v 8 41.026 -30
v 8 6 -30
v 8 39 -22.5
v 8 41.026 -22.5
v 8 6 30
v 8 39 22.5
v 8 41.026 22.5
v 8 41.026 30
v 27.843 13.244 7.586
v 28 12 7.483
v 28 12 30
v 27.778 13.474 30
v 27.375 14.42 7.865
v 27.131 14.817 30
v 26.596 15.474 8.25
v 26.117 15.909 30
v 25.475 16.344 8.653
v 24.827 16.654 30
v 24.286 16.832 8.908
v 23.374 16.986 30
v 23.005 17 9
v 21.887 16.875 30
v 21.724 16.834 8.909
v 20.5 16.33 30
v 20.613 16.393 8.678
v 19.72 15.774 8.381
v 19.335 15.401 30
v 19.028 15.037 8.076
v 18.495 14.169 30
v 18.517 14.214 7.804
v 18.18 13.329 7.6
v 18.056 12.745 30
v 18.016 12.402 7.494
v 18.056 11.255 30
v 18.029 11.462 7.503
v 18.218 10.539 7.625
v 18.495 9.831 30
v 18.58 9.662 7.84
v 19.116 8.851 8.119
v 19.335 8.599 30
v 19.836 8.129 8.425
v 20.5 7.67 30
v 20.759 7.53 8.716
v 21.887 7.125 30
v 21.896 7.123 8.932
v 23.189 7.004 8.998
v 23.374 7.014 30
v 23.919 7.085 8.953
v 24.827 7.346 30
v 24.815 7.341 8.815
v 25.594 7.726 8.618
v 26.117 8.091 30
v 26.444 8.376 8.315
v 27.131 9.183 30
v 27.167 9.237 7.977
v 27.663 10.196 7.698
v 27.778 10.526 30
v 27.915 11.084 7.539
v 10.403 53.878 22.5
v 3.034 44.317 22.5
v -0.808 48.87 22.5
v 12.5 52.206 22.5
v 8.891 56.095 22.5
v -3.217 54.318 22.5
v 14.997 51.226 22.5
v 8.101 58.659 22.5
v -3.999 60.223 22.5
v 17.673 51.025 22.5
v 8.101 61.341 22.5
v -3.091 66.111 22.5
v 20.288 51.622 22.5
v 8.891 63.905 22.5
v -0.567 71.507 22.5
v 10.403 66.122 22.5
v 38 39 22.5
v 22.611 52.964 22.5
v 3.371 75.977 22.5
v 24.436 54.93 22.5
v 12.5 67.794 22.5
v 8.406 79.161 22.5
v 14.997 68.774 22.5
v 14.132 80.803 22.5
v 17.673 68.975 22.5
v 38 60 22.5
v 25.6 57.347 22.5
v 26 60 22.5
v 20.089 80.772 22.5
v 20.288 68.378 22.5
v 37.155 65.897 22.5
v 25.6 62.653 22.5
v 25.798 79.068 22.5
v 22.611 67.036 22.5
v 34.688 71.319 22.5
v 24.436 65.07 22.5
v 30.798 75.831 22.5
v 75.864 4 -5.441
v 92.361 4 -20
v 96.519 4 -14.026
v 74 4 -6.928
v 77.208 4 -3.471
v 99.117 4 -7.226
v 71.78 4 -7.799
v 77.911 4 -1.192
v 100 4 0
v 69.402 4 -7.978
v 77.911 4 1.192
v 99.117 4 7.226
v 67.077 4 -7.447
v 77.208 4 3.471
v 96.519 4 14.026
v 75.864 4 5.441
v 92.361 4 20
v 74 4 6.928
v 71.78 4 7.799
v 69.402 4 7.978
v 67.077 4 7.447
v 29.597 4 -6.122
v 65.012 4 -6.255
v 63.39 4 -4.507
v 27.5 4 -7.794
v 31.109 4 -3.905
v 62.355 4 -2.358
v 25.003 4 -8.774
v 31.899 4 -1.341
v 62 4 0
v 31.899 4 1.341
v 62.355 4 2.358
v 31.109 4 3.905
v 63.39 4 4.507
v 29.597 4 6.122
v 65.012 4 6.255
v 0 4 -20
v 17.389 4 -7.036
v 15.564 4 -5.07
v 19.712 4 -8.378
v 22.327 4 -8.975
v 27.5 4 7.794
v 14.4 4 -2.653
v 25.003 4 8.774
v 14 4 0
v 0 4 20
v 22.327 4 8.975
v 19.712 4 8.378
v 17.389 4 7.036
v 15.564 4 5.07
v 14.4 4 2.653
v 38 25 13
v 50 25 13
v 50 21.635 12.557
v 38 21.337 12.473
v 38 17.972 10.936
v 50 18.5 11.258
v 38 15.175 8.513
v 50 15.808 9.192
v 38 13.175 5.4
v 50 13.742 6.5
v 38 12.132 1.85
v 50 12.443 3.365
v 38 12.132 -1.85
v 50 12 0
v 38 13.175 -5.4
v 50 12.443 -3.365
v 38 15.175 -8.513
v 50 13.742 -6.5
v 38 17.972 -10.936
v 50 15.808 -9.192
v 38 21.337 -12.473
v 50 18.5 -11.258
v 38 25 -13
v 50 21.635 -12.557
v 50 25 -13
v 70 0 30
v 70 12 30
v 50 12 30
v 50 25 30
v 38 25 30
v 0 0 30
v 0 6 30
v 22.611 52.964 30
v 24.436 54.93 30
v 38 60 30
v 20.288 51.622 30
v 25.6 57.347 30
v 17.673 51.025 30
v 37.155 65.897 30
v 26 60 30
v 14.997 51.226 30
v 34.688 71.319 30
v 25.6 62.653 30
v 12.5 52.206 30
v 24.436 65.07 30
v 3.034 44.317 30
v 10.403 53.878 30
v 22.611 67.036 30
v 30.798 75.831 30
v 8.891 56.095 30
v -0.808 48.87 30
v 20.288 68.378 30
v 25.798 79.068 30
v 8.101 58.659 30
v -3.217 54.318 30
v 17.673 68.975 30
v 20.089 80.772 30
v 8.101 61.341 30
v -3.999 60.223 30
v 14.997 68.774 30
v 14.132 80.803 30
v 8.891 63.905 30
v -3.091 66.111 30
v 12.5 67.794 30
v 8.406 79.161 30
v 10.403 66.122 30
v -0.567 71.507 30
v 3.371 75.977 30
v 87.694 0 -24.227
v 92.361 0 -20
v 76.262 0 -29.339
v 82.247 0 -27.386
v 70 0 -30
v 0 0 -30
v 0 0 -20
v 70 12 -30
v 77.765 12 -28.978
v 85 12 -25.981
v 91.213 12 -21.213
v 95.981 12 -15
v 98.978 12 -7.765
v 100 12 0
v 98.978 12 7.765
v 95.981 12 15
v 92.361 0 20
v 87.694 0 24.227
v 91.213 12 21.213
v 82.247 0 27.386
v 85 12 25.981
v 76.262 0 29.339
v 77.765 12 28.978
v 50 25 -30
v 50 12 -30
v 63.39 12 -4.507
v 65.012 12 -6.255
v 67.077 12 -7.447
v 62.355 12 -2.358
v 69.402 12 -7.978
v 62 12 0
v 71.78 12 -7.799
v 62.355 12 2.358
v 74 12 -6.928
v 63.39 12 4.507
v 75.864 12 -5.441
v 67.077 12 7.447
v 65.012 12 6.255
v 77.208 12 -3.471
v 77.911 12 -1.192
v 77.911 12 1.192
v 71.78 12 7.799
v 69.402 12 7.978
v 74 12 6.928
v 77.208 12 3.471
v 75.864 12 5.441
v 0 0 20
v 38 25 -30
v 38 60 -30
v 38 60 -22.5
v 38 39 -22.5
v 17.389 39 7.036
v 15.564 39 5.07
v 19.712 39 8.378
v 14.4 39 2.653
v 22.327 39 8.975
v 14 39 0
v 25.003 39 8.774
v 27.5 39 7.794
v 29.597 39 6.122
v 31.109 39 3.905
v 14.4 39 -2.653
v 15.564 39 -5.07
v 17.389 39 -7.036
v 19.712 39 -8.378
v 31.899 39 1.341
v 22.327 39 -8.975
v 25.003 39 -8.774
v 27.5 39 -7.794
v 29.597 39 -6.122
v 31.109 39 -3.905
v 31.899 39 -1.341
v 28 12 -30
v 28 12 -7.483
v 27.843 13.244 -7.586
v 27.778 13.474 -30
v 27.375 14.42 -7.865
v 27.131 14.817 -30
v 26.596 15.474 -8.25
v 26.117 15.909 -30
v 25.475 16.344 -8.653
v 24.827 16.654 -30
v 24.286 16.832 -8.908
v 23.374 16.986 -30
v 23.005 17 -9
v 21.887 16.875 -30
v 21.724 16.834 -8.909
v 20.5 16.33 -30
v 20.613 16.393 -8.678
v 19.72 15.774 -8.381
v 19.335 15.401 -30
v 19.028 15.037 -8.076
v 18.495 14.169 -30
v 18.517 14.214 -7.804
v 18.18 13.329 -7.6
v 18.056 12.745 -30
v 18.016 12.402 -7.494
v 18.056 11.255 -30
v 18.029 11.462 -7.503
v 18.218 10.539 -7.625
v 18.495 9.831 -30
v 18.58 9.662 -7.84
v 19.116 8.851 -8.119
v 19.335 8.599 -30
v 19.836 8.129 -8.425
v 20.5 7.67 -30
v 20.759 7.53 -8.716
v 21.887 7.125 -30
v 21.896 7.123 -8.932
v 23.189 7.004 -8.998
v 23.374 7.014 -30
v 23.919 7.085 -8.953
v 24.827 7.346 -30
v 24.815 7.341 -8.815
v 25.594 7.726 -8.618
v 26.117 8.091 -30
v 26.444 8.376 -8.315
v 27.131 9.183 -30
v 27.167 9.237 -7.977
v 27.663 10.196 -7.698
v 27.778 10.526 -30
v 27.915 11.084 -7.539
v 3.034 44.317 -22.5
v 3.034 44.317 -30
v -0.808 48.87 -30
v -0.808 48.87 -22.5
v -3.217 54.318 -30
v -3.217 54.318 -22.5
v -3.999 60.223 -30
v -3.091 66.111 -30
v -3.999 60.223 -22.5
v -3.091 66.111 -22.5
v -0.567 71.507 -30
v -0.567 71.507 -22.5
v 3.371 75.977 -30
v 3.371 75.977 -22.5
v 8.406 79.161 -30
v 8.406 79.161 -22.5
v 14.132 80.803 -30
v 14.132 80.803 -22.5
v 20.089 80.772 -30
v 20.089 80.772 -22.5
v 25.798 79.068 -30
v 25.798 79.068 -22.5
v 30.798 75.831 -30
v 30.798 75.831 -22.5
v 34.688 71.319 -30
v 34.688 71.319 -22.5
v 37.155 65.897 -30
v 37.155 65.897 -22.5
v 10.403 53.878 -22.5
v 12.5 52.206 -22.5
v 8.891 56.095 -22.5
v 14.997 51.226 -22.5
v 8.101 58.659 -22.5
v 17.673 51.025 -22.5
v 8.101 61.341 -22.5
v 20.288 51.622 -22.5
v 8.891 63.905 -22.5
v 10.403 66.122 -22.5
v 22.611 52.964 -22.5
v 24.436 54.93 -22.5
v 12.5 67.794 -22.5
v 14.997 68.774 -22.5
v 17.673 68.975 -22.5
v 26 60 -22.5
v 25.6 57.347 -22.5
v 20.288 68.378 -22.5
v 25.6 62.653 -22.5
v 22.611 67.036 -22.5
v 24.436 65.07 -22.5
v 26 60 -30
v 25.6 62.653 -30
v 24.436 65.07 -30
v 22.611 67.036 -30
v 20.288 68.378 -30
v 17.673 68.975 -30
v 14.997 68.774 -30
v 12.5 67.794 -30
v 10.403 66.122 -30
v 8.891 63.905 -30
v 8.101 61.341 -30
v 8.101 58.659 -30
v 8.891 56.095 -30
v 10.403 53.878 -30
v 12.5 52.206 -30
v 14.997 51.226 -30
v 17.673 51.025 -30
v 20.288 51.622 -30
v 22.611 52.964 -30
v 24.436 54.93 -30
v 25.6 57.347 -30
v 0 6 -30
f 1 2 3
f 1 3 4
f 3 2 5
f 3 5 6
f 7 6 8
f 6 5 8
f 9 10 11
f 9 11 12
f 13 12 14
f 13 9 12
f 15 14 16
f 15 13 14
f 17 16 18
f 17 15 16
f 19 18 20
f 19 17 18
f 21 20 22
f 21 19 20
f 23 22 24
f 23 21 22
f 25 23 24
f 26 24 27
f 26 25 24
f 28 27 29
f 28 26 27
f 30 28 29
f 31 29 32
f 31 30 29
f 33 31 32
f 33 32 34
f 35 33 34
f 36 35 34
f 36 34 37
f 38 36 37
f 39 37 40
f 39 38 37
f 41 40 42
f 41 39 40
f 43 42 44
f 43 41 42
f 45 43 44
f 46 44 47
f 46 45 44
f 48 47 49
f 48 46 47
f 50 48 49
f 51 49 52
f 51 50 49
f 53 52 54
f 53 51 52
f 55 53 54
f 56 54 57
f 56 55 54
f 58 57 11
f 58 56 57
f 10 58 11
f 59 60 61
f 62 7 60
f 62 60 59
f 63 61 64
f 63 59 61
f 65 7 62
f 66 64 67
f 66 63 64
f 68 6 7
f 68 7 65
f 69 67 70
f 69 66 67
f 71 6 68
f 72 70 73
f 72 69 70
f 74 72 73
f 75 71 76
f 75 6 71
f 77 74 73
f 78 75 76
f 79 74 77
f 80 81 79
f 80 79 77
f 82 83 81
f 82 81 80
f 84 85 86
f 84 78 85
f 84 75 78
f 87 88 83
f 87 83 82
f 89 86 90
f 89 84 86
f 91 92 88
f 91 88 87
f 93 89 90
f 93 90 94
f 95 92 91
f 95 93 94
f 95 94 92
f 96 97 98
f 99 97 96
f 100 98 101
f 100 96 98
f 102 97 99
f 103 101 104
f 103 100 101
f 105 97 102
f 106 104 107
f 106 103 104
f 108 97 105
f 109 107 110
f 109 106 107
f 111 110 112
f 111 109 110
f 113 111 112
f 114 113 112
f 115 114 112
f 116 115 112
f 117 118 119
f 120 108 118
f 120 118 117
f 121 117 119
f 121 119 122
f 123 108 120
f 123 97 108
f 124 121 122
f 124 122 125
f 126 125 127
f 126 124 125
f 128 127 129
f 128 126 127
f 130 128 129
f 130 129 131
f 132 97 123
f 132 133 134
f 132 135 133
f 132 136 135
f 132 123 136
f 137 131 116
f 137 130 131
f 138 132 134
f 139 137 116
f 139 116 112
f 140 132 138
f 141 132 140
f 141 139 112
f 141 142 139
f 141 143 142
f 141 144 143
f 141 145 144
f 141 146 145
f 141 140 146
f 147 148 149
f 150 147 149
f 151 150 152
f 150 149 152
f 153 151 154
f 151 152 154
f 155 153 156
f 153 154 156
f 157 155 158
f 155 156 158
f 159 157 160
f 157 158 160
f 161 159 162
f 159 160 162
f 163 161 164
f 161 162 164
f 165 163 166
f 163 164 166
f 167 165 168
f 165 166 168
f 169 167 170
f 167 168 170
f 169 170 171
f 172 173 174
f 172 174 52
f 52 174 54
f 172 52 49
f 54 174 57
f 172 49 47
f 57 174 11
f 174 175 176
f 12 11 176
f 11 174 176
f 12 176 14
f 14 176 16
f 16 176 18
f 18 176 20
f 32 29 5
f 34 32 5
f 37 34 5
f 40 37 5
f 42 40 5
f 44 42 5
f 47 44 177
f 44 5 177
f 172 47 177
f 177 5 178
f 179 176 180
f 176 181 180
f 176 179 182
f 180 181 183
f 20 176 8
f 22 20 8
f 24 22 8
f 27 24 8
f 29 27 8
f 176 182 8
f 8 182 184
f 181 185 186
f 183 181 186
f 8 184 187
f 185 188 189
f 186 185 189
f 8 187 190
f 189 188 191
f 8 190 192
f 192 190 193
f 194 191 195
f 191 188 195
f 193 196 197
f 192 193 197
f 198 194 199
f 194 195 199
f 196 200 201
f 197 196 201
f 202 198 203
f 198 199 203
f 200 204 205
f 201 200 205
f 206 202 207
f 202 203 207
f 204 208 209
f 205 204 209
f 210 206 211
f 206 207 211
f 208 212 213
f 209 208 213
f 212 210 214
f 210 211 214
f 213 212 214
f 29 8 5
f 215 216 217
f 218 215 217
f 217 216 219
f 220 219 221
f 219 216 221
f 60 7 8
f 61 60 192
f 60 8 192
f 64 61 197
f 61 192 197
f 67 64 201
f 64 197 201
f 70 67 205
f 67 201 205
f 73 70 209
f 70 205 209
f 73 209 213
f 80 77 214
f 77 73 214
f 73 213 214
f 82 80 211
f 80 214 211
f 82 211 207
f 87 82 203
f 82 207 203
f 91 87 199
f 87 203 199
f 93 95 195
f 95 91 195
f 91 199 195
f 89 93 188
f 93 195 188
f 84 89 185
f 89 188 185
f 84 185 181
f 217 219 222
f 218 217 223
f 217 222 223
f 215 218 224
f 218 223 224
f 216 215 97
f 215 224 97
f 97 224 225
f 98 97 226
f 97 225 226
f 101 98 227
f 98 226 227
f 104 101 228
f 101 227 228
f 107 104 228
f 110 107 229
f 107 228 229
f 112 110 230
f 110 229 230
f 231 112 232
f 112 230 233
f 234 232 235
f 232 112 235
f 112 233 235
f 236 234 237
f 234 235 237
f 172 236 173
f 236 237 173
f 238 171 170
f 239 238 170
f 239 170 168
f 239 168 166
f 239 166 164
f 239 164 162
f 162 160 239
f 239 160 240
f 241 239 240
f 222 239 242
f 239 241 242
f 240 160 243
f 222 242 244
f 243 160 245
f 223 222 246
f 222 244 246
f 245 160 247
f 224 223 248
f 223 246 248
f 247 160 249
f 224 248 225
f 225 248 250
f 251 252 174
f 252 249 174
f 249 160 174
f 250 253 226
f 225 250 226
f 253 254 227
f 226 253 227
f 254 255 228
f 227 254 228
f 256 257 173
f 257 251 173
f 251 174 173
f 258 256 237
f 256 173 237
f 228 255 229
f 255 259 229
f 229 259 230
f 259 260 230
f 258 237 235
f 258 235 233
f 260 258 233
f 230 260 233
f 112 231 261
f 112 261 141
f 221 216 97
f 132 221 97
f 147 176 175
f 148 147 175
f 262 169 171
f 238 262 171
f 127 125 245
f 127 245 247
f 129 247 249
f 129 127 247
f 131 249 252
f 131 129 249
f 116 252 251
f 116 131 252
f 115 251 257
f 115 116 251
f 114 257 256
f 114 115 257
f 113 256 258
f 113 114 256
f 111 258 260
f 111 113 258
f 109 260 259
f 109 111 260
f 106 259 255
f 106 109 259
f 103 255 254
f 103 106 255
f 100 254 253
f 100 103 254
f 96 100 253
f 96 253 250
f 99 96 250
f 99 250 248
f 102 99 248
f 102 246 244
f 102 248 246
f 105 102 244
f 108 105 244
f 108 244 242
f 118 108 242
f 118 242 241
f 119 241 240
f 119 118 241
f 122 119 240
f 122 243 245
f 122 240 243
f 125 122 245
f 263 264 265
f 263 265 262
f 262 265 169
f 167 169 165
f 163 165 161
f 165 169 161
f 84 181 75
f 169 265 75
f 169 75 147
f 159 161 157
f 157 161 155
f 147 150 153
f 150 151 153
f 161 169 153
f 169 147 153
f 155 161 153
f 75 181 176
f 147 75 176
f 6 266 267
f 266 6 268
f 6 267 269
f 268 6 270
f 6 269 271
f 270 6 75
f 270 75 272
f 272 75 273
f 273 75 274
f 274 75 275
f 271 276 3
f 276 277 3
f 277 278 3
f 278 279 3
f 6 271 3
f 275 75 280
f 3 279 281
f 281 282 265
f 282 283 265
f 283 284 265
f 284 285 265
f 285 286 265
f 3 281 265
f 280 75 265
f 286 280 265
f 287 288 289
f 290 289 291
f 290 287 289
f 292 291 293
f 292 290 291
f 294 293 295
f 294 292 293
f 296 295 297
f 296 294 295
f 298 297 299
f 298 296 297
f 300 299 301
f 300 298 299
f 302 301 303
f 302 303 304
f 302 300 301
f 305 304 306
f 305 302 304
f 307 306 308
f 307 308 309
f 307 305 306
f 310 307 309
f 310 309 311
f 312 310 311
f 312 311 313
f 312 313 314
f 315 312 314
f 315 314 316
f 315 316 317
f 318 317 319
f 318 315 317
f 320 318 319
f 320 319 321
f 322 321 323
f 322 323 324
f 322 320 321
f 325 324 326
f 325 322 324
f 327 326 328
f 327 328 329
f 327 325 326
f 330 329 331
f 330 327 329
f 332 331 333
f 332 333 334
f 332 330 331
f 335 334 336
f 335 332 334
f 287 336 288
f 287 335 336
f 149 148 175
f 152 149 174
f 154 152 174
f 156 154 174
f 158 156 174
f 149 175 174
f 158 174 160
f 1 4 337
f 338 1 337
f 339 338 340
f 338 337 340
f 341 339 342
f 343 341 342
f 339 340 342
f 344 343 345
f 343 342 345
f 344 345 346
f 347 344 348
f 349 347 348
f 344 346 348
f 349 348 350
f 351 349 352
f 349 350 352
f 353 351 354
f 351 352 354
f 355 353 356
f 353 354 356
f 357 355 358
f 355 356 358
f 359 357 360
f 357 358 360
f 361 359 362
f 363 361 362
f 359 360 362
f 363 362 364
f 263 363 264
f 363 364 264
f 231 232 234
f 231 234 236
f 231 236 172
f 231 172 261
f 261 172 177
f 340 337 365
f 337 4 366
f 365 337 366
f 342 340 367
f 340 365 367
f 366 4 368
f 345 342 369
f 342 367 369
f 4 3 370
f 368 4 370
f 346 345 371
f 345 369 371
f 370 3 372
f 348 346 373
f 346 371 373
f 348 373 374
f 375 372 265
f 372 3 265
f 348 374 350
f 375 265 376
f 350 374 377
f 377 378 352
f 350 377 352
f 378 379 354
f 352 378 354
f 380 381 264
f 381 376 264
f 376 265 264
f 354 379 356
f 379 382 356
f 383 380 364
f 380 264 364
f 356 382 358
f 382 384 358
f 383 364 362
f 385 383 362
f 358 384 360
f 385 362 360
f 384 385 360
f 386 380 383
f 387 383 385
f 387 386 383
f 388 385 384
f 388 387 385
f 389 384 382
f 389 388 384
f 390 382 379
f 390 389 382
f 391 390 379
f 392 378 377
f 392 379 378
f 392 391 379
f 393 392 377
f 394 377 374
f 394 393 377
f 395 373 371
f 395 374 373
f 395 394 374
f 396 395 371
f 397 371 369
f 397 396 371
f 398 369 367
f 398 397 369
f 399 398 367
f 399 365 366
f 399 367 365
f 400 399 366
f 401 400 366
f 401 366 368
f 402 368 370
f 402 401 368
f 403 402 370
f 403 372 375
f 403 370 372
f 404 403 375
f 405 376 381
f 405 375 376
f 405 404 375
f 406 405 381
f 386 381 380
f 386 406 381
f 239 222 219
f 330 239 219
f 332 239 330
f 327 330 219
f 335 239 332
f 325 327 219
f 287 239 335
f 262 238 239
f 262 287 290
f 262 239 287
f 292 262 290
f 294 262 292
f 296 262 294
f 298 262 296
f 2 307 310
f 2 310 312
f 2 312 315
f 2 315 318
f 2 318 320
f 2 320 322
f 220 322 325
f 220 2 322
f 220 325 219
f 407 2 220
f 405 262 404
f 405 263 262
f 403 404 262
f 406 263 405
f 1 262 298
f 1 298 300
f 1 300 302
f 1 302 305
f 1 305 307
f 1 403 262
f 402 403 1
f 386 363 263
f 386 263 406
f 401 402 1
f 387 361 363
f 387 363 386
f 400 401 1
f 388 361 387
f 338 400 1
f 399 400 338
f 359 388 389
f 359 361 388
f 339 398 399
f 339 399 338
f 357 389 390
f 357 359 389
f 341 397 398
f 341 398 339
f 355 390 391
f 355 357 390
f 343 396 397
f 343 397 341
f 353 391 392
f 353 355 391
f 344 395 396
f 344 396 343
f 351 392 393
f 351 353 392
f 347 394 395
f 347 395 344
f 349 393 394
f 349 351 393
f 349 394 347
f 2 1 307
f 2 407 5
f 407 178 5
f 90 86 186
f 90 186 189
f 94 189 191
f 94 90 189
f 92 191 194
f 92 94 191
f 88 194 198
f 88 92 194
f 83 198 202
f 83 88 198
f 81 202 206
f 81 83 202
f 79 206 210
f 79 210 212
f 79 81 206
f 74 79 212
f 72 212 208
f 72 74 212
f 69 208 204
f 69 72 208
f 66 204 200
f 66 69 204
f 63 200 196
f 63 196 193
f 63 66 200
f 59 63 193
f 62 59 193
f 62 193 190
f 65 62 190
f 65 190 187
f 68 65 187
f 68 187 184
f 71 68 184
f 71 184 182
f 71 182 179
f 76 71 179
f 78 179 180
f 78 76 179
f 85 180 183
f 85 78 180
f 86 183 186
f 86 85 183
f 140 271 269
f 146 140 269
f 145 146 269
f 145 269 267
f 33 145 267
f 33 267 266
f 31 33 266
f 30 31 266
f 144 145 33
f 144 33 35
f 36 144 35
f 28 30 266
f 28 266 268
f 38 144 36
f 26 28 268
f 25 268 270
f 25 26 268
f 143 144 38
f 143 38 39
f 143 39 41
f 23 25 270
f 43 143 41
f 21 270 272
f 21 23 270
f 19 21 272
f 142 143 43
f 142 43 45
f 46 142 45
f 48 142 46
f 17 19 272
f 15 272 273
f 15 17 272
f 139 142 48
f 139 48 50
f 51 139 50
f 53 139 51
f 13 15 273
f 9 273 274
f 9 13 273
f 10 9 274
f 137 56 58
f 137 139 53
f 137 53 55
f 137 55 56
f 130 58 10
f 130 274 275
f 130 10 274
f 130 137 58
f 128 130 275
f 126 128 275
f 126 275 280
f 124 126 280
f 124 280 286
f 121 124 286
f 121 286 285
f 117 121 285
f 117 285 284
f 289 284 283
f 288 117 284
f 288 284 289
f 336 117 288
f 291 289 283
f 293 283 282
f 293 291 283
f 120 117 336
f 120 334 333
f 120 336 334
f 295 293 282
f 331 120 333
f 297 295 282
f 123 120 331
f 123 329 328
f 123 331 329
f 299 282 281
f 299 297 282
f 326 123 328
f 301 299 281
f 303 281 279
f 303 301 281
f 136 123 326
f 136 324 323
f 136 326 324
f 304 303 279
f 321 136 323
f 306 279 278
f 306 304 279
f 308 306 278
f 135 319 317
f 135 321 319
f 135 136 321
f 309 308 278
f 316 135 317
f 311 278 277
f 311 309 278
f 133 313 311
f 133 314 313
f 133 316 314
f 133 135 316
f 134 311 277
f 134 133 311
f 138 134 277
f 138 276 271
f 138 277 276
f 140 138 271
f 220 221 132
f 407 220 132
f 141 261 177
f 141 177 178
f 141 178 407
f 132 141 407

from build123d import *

# Parameters (mm, degrees)
SKETCH1_R               = 9
SKETCH1_R_2             = 5
BOSS_EXTRUDE1_DEPTH     = 30
SKETCH2_W               = 45
SKETCH2_H               = 42
CUT_EXTRUDE2_DEPTH      = 107.324973548
CUT_EXTRUDE3_DEPTH      = 60
CUT_EXTRUDE4_DEPTH      = 113.534439173
CUT_EXTRUDE4_DEPTH_BACK = 113.534439173
SKETCH4_R               = 9
SKETCH4_R_2             = 8
SKETCH5_R               = 13
CUT_EXTRUDE5_DEPTH      = 12
SKETCH6_W               = 40
SKETCH6_H               = 4
CUT_EXTRUDE6_DEPTH      = 133.140077214


with BuildPart() as part:
    # Sketch1 → Boss-Extrude1 (new, symmetric)
    with BuildSketch(Plane.XY):
        with BuildLine():
            Line((0, 0), (0, 6))
            Line((0, 6), (8, 6))
            Line((8, 6), (8, 41.026334039))
            ThreePointArc((8, 41.026334039), (5.77502784, 77.748239349), (38, 60))
            Line((38, 60), (38, 25))
            Line((38, 25), (50, 25))
            Line((50, 25), (50, 12))
            Line((50, 12), (100, 12))
            Line((100, 12), (100, 0))
            Line((100, 0), (0, 0))
        make_face()
        with Locations((17, 60)):
            Circle(SKETCH1_R, mode=Mode.SUBTRACT)
        with Locations((23, 12)):
            Circle(SKETCH1_R_2, mode=Mode.SUBTRACT)
    extrude(amount=BOSS_EXTRUDE1_DEPTH, both=True)

    # Sketch2 → Cut-Extrude2 (cut, through all)
    with BuildSketch(Plane(origin=(38, 0, 0), x_dir=(0, 0, -1), z_dir=(1, 0, 0))):
        with Locations((0, 60)):
            Rectangle(SKETCH2_W, SKETCH2_H)
    extrude(amount=-CUT_EXTRUDE2_DEPTH, mode=Mode.SUBTRACT)

    # Sketch3 → Cut-Extrude3 (cut)
    with BuildSketch(Plane(origin=(0, 12, 0), x_dir=(1, 0, 0), z_dir=(0, 1, 0))):
        with BuildLine():
            ThreePointArc((70, 30), (91.213203436, 21.213203436), (100, 0))
            Line((100, 0), (100, 30))
            Line((100, 30), (70, 30))
        make_face()
        with BuildLine():
            Line((100, -30), (100, 0))
            ThreePointArc((100, 0), (91.213203436, -21.213203436), (70, -30))
            Line((70, -30), (100, -30))
        make_face()
    extrude(amount=-CUT_EXTRUDE3_DEPTH, mode=Mode.SUBTRACT)

    # Sketch4 → Cut-Extrude4 (cut, two sides: drawn at the far end of the back side and taken through both)
    with BuildSketch(Plane(origin=(0, 39, 0), x_dir=(1, 0, 0), z_dir=(0, 1, 0)).offset(-CUT_EXTRUDE4_DEPTH_BACK)):
        with Locations(Location((23, 0, 0), (0, 0, 180))):
            Circle(SKETCH4_R)
        with Locations(Location((70, 0, 0), (0, 0, 180))):
            Circle(SKETCH4_R_2)
    extrude(amount=CUT_EXTRUDE4_DEPTH + CUT_EXTRUDE4_DEPTH_BACK, mode=Mode.SUBTRACT)

    # Sketch5 → Cut-Extrude5 (cut)
    with BuildSketch(Plane(origin=(50, 0, 0), x_dir=(0, 0, -1), z_dir=(1, 0, 0))):
        with Locations((0, 25)):
            Circle(SKETCH5_R)
    extrude(amount=-CUT_EXTRUDE5_DEPTH, mode=Mode.SUBTRACT)

    # Sketch6 → Cut-Extrude6 (cut, through all)
    with BuildSketch(Plane.ZY):
        with Locations((0, 2)):
            Rectangle(SKETCH6_W, SKETCH6_H)
    extrude(amount=-CUT_EXTRUDE6_DEPTH, mode=Mode.SUBTRACT)


solid = part.part
